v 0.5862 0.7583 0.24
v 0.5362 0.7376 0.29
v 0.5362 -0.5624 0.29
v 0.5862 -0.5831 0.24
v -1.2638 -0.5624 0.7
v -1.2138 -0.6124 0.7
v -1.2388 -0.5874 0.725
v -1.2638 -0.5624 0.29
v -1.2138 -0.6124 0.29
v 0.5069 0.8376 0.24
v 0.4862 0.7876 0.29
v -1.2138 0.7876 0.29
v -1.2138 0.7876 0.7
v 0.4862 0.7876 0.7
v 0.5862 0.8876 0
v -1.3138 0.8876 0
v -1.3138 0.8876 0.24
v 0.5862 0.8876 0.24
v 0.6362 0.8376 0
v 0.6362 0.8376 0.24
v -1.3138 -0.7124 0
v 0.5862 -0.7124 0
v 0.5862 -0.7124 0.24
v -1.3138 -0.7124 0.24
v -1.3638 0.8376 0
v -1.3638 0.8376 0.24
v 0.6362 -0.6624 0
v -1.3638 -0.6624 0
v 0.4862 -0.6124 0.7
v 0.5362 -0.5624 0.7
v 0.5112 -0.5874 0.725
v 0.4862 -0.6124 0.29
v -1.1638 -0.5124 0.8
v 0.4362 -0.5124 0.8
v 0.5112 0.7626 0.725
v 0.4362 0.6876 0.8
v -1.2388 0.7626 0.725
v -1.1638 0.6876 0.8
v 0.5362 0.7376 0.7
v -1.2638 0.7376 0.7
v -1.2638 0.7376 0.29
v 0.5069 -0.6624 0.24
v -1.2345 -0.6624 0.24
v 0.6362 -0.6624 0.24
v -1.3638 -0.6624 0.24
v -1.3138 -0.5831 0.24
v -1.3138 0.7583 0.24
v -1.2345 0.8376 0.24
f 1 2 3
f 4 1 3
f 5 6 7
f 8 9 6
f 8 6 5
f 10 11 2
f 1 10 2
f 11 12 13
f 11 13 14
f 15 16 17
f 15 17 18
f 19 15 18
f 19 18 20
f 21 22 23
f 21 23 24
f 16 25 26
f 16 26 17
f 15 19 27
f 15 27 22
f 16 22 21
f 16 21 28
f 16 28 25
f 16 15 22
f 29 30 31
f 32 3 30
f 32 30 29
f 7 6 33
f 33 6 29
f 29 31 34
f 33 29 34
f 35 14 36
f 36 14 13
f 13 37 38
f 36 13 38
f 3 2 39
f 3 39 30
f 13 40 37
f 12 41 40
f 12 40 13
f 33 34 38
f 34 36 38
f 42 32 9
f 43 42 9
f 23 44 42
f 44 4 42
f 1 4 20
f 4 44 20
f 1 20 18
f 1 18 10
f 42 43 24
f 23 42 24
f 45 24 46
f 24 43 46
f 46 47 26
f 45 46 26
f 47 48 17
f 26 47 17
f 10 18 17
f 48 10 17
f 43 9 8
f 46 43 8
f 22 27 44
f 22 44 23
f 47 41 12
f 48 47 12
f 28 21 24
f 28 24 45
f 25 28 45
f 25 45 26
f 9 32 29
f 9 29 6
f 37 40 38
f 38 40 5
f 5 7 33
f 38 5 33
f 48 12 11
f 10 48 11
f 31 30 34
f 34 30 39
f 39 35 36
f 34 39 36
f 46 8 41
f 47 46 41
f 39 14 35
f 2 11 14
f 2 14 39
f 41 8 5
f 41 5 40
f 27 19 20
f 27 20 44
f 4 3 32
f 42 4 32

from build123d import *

# Parameters (mm, degrees)
BOSS_EXTRUDE1_DEPTH = 0.24
BOSS_EXTRUDE2_DEPTH = 0.56
CHAMFER1_SIZE       = 0.1
CHAMFER2_SIZE       = 0.05


with BuildPart() as part:
    # Sketch3 → Boss-Extrude1 (new body)
    with BuildSketch(Plane.XY):
        Polygon((-1.363809524, 0.837619048), (-1.313809524, 0.887619048), (0.586190476, 0.887619048), (0.636190476, 0.837619048), (0.636190476, -0.662380952), (0.586190476, -0.712380952), (-1.313809524, -0.712380952), (-1.363809524, -0.662380952), align=None)
    extrude(amount=BOSS_EXTRUDE1_DEPTH)

    # Sketch4 → Boss-Extrude2 (add)
    with BuildSketch(Plane.XY.offset(0.24)):
        Polygon((-1.263809524, 0.737619048), (-1.213809524, 0.787619048), (0.486190476, 0.787619048), (0.536190476, 0.737619048), (0.536190476, -0.562380952), (0.486190476, -0.612380952), (-1.213809524, -0.612380952), (-1.263809524, -0.562380952), align=None)
    extrude(amount=BOSS_EXTRUDE2_DEPTH)

    # Chamfer1
    # the kernel refuses this chamfer: 0.1 mm, written as the material it takes off along each edge
    with BuildSketch(Plane(origin=(-1.470977823, 0.787619048, 0.8), x_dir=(0, 0.027495876610586285, -0.9996219169112968), z_dir=(1, 0, 0)), Plane(origin=(0.743358775, -0.612380952, 0.8), x_dir=(0, -0.027495876610586285, -0.9996219169112968), z_dir=(-1, 0, 0))) as chamfer1_piece_1:
        Polygon((CHAMFER1_SIZE * 0.999621916911, -CHAMFER1_SIZE * 0.0274958766106), (-CHAMFER1_SIZE * 0.0274958766106, -CHAMFER1_SIZE * 0.999621916911), (0, 0), align=None)
    extrude(amount=2.214336598, mode=Mode.SUBTRACT)
    with BuildSketch(Plane(origin=(0.536190476, 0.994787346, 0.8), x_dir=(0.027495876610586285, 0, -0.9996219169112968), z_dir=(0, -1, 0)), Plane(origin=(-1.263809524, -0.819549251, 0.8), x_dir=(-0.02749587661058736, 0, -0.9996219169112966), z_dir=(0, 1, 0))) as chamfer1_piece_2:
        Polygon((CHAMFER1_SIZE * 0.999621916911, -CHAMFER1_SIZE * 0.0274958766106), (-CHAMFER1_SIZE * 0.0274958766106, -CHAMFER1_SIZE * 0.999621916911), (0, 0), align=None)
    extrude(amount=1.814336598, mode=Mode.SUBTRACT)

    # Chamfer2
    chamfer2_edges = [part.edges().sort_by_distance(p)[0] for p in [
        (-0.363809524, 0.787619048, 0.24),
        (-1.238809524, 0.762619048, 0.24),
        (-1.263809524, 0.087619048, 0.24),
        (-1.238809524, -0.587380952, 0.24),
        (-0.363809524, -0.612380952, 0.24),
        (0.511190476, -0.587380952, 0.24),
        (0.536190476, 0.087619048, 0.24),
        (0.511190476, 0.762619048, 0.24),
    ]]
    chamfer(chamfer2_edges, length=CHAMFER2_SIZE)


solid = part.part
